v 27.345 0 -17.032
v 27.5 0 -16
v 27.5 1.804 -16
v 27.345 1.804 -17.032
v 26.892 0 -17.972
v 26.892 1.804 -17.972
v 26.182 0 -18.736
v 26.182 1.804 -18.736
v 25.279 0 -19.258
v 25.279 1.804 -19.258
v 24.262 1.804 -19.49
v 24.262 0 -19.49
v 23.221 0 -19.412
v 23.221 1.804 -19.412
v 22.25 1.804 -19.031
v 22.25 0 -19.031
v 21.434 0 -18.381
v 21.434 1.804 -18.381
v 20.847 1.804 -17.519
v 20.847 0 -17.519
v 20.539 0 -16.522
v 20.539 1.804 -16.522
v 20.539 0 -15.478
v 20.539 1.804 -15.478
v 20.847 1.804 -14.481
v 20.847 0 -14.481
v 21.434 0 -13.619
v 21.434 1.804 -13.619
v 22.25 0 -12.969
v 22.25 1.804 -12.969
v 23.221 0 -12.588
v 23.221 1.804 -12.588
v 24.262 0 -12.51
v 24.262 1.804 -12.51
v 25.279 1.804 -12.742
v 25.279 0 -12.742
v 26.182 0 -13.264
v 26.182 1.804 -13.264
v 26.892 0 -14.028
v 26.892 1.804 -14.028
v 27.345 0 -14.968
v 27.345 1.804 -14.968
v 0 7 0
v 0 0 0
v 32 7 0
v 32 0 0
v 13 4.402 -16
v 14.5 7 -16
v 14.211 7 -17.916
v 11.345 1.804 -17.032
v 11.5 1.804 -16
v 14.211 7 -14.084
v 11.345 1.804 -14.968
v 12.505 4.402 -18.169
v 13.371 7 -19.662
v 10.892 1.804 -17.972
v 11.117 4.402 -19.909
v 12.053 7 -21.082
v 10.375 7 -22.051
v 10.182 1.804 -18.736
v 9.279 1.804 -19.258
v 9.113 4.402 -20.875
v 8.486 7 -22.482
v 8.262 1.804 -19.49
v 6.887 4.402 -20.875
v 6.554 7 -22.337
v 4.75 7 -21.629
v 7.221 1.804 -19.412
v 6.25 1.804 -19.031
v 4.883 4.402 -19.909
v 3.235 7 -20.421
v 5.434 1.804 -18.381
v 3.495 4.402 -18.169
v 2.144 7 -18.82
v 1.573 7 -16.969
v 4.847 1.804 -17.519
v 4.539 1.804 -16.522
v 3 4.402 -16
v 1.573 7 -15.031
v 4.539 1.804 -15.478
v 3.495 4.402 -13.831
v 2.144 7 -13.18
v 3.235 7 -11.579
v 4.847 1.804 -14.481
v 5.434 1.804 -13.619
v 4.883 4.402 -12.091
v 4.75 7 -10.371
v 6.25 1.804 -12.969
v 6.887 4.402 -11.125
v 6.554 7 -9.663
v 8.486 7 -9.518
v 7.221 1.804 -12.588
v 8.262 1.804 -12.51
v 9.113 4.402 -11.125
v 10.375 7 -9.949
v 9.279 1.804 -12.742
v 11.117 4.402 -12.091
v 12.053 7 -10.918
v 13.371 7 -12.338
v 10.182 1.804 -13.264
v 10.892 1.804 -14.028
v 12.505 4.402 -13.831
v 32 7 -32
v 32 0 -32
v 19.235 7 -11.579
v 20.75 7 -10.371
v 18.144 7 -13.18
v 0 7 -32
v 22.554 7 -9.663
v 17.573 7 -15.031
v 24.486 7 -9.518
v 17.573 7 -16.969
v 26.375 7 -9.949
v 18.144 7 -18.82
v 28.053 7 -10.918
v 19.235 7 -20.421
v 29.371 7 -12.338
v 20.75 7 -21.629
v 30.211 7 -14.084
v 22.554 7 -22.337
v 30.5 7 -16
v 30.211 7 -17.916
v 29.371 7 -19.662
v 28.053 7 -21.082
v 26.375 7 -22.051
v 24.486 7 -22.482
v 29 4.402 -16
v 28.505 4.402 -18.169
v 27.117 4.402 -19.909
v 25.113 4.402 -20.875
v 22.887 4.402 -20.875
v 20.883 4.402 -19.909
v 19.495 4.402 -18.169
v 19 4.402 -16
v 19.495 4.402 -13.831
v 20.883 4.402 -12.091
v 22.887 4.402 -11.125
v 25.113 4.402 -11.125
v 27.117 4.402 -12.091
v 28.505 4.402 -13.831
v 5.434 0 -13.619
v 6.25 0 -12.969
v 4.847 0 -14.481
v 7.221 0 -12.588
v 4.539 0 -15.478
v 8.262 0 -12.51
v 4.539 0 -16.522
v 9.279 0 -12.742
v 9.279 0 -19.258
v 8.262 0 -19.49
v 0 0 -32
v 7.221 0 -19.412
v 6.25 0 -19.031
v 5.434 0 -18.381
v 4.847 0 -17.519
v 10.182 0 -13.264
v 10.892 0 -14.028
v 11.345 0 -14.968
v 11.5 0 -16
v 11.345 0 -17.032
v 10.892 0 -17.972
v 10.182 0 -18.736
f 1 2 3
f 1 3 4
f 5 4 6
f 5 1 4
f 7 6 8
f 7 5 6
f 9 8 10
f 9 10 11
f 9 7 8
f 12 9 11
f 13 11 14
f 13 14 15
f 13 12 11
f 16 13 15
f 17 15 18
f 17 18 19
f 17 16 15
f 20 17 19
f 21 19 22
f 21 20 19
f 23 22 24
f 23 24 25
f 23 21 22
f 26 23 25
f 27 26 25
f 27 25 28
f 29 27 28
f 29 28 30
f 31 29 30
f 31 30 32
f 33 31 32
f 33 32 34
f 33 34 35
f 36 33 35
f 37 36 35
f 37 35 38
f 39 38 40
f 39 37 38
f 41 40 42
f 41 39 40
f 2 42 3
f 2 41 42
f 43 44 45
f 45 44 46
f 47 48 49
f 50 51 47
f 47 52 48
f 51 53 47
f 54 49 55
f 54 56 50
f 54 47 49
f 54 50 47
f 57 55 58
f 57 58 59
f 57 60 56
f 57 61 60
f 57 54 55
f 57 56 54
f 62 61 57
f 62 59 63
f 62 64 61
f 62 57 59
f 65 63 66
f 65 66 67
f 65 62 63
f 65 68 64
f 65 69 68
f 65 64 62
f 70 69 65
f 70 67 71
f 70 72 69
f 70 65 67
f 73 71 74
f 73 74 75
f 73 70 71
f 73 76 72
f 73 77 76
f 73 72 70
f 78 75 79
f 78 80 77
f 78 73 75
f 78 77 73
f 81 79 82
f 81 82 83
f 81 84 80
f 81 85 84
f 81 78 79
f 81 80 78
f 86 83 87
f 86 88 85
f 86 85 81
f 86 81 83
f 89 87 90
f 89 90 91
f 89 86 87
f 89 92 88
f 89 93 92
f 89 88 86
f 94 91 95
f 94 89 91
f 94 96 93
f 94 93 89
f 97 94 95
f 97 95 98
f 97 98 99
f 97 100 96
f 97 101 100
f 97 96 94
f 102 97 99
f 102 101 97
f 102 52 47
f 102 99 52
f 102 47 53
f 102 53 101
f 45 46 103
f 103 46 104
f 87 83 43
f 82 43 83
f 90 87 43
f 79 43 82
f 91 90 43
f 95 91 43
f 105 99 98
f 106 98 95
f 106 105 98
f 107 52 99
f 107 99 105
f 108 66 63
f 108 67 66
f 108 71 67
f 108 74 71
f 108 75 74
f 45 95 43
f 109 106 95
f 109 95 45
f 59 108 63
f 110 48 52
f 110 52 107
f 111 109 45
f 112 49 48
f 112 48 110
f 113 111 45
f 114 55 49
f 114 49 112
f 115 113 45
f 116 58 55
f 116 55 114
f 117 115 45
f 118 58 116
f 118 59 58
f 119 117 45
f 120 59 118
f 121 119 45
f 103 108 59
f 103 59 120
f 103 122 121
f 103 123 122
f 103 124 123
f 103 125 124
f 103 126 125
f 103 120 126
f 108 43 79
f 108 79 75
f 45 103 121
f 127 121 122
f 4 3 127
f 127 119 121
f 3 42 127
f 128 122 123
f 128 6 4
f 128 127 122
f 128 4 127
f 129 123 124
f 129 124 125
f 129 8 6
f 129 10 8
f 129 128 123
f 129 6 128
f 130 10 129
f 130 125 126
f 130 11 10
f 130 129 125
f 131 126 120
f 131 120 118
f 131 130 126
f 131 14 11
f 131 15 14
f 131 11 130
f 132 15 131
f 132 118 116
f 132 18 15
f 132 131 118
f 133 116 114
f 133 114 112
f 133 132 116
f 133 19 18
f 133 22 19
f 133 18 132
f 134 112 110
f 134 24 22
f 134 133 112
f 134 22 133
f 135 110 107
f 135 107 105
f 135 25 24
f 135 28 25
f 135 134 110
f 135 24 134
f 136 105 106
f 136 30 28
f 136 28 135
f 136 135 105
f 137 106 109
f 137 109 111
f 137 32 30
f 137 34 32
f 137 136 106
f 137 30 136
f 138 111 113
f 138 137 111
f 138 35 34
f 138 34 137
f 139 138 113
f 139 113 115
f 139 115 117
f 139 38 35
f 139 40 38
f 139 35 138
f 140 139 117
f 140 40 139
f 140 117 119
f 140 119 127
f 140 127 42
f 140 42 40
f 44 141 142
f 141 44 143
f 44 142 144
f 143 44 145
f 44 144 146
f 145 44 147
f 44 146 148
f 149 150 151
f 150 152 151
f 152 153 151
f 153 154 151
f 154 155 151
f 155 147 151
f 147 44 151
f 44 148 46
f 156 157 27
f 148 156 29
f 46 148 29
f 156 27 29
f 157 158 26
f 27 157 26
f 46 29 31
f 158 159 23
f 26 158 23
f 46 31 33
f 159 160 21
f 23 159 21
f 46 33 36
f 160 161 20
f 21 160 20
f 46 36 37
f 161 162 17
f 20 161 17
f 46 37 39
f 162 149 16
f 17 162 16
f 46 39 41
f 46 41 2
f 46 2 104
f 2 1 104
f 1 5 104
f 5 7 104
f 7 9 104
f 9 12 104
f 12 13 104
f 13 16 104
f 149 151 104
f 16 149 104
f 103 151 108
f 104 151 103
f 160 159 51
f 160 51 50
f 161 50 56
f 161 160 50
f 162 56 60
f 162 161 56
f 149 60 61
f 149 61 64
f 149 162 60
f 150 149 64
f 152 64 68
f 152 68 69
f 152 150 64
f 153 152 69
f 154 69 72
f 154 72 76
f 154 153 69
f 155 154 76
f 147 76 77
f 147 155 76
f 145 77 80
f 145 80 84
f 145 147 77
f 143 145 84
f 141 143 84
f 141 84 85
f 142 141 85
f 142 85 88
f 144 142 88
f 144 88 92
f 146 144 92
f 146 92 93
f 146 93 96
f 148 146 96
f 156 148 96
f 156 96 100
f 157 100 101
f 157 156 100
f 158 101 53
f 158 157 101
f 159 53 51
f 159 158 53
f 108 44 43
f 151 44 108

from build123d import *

# Parameters (mm, degrees)
SKETCH2_W           = 32
SKETCH2_H           = 32
SKETCH2_R           = 3.5
BOSS_EXTRUDE1_DEPTH = 7
CHAMFER2_SIZE       = 3
CHAMFER2_SIZE2      = 5.196152423
CHAMFER3_SIZE       = 3
CHAMFER3_SIZE2      = 5.196152423


with BuildPart() as part:
    # Sketch2 → Boss-Extrude1 (new body)
    with BuildSketch(Plane(origin=(0, 0, 0), x_dir=(1, 0, 0), z_dir=(0, 1, 0))):
        with Locations((16, 16)):
            Rectangle(SKETCH2_W, SKETCH2_H)
        with Locations((8, 16)):
            Circle(SKETCH2_R, mode=Mode.SUBTRACT)
        with Locations((24, 16)):
            Circle(SKETCH2_R, mode=Mode.SUBTRACT)
    extrude(amount=BOSS_EXTRUDE1_DEPTH)

    # Chamfer2
    chamfer2_edges = [part.edges().sort_by_distance(p)[0] for p in [
        (20.5, 7, -16),
    ]]
    chamfer2_side = [part.faces().sort_by_distance(p)[0] for p in [
        (16, 7, -16),
    ]]
    chamfer(chamfer2_edges, length=CHAMFER2_SIZE, length2=CHAMFER2_SIZE2, reference=chamfer2_side[0])

    # Chamfer3
    chamfer3_edges = [part.edges().sort_by_distance(p)[0] for p in [
        (4.5, 7, -16),
    ]]
    chamfer3_side = [part.faces().sort_by_distance(p)[0] for p in [
        (15.115857071, 7, -16),
    ]]
    chamfer(chamfer3_edges, length=CHAMFER3_SIZE, length2=CHAMFER3_SIZE2, reference=chamfer3_side[0])


solid = part.part
